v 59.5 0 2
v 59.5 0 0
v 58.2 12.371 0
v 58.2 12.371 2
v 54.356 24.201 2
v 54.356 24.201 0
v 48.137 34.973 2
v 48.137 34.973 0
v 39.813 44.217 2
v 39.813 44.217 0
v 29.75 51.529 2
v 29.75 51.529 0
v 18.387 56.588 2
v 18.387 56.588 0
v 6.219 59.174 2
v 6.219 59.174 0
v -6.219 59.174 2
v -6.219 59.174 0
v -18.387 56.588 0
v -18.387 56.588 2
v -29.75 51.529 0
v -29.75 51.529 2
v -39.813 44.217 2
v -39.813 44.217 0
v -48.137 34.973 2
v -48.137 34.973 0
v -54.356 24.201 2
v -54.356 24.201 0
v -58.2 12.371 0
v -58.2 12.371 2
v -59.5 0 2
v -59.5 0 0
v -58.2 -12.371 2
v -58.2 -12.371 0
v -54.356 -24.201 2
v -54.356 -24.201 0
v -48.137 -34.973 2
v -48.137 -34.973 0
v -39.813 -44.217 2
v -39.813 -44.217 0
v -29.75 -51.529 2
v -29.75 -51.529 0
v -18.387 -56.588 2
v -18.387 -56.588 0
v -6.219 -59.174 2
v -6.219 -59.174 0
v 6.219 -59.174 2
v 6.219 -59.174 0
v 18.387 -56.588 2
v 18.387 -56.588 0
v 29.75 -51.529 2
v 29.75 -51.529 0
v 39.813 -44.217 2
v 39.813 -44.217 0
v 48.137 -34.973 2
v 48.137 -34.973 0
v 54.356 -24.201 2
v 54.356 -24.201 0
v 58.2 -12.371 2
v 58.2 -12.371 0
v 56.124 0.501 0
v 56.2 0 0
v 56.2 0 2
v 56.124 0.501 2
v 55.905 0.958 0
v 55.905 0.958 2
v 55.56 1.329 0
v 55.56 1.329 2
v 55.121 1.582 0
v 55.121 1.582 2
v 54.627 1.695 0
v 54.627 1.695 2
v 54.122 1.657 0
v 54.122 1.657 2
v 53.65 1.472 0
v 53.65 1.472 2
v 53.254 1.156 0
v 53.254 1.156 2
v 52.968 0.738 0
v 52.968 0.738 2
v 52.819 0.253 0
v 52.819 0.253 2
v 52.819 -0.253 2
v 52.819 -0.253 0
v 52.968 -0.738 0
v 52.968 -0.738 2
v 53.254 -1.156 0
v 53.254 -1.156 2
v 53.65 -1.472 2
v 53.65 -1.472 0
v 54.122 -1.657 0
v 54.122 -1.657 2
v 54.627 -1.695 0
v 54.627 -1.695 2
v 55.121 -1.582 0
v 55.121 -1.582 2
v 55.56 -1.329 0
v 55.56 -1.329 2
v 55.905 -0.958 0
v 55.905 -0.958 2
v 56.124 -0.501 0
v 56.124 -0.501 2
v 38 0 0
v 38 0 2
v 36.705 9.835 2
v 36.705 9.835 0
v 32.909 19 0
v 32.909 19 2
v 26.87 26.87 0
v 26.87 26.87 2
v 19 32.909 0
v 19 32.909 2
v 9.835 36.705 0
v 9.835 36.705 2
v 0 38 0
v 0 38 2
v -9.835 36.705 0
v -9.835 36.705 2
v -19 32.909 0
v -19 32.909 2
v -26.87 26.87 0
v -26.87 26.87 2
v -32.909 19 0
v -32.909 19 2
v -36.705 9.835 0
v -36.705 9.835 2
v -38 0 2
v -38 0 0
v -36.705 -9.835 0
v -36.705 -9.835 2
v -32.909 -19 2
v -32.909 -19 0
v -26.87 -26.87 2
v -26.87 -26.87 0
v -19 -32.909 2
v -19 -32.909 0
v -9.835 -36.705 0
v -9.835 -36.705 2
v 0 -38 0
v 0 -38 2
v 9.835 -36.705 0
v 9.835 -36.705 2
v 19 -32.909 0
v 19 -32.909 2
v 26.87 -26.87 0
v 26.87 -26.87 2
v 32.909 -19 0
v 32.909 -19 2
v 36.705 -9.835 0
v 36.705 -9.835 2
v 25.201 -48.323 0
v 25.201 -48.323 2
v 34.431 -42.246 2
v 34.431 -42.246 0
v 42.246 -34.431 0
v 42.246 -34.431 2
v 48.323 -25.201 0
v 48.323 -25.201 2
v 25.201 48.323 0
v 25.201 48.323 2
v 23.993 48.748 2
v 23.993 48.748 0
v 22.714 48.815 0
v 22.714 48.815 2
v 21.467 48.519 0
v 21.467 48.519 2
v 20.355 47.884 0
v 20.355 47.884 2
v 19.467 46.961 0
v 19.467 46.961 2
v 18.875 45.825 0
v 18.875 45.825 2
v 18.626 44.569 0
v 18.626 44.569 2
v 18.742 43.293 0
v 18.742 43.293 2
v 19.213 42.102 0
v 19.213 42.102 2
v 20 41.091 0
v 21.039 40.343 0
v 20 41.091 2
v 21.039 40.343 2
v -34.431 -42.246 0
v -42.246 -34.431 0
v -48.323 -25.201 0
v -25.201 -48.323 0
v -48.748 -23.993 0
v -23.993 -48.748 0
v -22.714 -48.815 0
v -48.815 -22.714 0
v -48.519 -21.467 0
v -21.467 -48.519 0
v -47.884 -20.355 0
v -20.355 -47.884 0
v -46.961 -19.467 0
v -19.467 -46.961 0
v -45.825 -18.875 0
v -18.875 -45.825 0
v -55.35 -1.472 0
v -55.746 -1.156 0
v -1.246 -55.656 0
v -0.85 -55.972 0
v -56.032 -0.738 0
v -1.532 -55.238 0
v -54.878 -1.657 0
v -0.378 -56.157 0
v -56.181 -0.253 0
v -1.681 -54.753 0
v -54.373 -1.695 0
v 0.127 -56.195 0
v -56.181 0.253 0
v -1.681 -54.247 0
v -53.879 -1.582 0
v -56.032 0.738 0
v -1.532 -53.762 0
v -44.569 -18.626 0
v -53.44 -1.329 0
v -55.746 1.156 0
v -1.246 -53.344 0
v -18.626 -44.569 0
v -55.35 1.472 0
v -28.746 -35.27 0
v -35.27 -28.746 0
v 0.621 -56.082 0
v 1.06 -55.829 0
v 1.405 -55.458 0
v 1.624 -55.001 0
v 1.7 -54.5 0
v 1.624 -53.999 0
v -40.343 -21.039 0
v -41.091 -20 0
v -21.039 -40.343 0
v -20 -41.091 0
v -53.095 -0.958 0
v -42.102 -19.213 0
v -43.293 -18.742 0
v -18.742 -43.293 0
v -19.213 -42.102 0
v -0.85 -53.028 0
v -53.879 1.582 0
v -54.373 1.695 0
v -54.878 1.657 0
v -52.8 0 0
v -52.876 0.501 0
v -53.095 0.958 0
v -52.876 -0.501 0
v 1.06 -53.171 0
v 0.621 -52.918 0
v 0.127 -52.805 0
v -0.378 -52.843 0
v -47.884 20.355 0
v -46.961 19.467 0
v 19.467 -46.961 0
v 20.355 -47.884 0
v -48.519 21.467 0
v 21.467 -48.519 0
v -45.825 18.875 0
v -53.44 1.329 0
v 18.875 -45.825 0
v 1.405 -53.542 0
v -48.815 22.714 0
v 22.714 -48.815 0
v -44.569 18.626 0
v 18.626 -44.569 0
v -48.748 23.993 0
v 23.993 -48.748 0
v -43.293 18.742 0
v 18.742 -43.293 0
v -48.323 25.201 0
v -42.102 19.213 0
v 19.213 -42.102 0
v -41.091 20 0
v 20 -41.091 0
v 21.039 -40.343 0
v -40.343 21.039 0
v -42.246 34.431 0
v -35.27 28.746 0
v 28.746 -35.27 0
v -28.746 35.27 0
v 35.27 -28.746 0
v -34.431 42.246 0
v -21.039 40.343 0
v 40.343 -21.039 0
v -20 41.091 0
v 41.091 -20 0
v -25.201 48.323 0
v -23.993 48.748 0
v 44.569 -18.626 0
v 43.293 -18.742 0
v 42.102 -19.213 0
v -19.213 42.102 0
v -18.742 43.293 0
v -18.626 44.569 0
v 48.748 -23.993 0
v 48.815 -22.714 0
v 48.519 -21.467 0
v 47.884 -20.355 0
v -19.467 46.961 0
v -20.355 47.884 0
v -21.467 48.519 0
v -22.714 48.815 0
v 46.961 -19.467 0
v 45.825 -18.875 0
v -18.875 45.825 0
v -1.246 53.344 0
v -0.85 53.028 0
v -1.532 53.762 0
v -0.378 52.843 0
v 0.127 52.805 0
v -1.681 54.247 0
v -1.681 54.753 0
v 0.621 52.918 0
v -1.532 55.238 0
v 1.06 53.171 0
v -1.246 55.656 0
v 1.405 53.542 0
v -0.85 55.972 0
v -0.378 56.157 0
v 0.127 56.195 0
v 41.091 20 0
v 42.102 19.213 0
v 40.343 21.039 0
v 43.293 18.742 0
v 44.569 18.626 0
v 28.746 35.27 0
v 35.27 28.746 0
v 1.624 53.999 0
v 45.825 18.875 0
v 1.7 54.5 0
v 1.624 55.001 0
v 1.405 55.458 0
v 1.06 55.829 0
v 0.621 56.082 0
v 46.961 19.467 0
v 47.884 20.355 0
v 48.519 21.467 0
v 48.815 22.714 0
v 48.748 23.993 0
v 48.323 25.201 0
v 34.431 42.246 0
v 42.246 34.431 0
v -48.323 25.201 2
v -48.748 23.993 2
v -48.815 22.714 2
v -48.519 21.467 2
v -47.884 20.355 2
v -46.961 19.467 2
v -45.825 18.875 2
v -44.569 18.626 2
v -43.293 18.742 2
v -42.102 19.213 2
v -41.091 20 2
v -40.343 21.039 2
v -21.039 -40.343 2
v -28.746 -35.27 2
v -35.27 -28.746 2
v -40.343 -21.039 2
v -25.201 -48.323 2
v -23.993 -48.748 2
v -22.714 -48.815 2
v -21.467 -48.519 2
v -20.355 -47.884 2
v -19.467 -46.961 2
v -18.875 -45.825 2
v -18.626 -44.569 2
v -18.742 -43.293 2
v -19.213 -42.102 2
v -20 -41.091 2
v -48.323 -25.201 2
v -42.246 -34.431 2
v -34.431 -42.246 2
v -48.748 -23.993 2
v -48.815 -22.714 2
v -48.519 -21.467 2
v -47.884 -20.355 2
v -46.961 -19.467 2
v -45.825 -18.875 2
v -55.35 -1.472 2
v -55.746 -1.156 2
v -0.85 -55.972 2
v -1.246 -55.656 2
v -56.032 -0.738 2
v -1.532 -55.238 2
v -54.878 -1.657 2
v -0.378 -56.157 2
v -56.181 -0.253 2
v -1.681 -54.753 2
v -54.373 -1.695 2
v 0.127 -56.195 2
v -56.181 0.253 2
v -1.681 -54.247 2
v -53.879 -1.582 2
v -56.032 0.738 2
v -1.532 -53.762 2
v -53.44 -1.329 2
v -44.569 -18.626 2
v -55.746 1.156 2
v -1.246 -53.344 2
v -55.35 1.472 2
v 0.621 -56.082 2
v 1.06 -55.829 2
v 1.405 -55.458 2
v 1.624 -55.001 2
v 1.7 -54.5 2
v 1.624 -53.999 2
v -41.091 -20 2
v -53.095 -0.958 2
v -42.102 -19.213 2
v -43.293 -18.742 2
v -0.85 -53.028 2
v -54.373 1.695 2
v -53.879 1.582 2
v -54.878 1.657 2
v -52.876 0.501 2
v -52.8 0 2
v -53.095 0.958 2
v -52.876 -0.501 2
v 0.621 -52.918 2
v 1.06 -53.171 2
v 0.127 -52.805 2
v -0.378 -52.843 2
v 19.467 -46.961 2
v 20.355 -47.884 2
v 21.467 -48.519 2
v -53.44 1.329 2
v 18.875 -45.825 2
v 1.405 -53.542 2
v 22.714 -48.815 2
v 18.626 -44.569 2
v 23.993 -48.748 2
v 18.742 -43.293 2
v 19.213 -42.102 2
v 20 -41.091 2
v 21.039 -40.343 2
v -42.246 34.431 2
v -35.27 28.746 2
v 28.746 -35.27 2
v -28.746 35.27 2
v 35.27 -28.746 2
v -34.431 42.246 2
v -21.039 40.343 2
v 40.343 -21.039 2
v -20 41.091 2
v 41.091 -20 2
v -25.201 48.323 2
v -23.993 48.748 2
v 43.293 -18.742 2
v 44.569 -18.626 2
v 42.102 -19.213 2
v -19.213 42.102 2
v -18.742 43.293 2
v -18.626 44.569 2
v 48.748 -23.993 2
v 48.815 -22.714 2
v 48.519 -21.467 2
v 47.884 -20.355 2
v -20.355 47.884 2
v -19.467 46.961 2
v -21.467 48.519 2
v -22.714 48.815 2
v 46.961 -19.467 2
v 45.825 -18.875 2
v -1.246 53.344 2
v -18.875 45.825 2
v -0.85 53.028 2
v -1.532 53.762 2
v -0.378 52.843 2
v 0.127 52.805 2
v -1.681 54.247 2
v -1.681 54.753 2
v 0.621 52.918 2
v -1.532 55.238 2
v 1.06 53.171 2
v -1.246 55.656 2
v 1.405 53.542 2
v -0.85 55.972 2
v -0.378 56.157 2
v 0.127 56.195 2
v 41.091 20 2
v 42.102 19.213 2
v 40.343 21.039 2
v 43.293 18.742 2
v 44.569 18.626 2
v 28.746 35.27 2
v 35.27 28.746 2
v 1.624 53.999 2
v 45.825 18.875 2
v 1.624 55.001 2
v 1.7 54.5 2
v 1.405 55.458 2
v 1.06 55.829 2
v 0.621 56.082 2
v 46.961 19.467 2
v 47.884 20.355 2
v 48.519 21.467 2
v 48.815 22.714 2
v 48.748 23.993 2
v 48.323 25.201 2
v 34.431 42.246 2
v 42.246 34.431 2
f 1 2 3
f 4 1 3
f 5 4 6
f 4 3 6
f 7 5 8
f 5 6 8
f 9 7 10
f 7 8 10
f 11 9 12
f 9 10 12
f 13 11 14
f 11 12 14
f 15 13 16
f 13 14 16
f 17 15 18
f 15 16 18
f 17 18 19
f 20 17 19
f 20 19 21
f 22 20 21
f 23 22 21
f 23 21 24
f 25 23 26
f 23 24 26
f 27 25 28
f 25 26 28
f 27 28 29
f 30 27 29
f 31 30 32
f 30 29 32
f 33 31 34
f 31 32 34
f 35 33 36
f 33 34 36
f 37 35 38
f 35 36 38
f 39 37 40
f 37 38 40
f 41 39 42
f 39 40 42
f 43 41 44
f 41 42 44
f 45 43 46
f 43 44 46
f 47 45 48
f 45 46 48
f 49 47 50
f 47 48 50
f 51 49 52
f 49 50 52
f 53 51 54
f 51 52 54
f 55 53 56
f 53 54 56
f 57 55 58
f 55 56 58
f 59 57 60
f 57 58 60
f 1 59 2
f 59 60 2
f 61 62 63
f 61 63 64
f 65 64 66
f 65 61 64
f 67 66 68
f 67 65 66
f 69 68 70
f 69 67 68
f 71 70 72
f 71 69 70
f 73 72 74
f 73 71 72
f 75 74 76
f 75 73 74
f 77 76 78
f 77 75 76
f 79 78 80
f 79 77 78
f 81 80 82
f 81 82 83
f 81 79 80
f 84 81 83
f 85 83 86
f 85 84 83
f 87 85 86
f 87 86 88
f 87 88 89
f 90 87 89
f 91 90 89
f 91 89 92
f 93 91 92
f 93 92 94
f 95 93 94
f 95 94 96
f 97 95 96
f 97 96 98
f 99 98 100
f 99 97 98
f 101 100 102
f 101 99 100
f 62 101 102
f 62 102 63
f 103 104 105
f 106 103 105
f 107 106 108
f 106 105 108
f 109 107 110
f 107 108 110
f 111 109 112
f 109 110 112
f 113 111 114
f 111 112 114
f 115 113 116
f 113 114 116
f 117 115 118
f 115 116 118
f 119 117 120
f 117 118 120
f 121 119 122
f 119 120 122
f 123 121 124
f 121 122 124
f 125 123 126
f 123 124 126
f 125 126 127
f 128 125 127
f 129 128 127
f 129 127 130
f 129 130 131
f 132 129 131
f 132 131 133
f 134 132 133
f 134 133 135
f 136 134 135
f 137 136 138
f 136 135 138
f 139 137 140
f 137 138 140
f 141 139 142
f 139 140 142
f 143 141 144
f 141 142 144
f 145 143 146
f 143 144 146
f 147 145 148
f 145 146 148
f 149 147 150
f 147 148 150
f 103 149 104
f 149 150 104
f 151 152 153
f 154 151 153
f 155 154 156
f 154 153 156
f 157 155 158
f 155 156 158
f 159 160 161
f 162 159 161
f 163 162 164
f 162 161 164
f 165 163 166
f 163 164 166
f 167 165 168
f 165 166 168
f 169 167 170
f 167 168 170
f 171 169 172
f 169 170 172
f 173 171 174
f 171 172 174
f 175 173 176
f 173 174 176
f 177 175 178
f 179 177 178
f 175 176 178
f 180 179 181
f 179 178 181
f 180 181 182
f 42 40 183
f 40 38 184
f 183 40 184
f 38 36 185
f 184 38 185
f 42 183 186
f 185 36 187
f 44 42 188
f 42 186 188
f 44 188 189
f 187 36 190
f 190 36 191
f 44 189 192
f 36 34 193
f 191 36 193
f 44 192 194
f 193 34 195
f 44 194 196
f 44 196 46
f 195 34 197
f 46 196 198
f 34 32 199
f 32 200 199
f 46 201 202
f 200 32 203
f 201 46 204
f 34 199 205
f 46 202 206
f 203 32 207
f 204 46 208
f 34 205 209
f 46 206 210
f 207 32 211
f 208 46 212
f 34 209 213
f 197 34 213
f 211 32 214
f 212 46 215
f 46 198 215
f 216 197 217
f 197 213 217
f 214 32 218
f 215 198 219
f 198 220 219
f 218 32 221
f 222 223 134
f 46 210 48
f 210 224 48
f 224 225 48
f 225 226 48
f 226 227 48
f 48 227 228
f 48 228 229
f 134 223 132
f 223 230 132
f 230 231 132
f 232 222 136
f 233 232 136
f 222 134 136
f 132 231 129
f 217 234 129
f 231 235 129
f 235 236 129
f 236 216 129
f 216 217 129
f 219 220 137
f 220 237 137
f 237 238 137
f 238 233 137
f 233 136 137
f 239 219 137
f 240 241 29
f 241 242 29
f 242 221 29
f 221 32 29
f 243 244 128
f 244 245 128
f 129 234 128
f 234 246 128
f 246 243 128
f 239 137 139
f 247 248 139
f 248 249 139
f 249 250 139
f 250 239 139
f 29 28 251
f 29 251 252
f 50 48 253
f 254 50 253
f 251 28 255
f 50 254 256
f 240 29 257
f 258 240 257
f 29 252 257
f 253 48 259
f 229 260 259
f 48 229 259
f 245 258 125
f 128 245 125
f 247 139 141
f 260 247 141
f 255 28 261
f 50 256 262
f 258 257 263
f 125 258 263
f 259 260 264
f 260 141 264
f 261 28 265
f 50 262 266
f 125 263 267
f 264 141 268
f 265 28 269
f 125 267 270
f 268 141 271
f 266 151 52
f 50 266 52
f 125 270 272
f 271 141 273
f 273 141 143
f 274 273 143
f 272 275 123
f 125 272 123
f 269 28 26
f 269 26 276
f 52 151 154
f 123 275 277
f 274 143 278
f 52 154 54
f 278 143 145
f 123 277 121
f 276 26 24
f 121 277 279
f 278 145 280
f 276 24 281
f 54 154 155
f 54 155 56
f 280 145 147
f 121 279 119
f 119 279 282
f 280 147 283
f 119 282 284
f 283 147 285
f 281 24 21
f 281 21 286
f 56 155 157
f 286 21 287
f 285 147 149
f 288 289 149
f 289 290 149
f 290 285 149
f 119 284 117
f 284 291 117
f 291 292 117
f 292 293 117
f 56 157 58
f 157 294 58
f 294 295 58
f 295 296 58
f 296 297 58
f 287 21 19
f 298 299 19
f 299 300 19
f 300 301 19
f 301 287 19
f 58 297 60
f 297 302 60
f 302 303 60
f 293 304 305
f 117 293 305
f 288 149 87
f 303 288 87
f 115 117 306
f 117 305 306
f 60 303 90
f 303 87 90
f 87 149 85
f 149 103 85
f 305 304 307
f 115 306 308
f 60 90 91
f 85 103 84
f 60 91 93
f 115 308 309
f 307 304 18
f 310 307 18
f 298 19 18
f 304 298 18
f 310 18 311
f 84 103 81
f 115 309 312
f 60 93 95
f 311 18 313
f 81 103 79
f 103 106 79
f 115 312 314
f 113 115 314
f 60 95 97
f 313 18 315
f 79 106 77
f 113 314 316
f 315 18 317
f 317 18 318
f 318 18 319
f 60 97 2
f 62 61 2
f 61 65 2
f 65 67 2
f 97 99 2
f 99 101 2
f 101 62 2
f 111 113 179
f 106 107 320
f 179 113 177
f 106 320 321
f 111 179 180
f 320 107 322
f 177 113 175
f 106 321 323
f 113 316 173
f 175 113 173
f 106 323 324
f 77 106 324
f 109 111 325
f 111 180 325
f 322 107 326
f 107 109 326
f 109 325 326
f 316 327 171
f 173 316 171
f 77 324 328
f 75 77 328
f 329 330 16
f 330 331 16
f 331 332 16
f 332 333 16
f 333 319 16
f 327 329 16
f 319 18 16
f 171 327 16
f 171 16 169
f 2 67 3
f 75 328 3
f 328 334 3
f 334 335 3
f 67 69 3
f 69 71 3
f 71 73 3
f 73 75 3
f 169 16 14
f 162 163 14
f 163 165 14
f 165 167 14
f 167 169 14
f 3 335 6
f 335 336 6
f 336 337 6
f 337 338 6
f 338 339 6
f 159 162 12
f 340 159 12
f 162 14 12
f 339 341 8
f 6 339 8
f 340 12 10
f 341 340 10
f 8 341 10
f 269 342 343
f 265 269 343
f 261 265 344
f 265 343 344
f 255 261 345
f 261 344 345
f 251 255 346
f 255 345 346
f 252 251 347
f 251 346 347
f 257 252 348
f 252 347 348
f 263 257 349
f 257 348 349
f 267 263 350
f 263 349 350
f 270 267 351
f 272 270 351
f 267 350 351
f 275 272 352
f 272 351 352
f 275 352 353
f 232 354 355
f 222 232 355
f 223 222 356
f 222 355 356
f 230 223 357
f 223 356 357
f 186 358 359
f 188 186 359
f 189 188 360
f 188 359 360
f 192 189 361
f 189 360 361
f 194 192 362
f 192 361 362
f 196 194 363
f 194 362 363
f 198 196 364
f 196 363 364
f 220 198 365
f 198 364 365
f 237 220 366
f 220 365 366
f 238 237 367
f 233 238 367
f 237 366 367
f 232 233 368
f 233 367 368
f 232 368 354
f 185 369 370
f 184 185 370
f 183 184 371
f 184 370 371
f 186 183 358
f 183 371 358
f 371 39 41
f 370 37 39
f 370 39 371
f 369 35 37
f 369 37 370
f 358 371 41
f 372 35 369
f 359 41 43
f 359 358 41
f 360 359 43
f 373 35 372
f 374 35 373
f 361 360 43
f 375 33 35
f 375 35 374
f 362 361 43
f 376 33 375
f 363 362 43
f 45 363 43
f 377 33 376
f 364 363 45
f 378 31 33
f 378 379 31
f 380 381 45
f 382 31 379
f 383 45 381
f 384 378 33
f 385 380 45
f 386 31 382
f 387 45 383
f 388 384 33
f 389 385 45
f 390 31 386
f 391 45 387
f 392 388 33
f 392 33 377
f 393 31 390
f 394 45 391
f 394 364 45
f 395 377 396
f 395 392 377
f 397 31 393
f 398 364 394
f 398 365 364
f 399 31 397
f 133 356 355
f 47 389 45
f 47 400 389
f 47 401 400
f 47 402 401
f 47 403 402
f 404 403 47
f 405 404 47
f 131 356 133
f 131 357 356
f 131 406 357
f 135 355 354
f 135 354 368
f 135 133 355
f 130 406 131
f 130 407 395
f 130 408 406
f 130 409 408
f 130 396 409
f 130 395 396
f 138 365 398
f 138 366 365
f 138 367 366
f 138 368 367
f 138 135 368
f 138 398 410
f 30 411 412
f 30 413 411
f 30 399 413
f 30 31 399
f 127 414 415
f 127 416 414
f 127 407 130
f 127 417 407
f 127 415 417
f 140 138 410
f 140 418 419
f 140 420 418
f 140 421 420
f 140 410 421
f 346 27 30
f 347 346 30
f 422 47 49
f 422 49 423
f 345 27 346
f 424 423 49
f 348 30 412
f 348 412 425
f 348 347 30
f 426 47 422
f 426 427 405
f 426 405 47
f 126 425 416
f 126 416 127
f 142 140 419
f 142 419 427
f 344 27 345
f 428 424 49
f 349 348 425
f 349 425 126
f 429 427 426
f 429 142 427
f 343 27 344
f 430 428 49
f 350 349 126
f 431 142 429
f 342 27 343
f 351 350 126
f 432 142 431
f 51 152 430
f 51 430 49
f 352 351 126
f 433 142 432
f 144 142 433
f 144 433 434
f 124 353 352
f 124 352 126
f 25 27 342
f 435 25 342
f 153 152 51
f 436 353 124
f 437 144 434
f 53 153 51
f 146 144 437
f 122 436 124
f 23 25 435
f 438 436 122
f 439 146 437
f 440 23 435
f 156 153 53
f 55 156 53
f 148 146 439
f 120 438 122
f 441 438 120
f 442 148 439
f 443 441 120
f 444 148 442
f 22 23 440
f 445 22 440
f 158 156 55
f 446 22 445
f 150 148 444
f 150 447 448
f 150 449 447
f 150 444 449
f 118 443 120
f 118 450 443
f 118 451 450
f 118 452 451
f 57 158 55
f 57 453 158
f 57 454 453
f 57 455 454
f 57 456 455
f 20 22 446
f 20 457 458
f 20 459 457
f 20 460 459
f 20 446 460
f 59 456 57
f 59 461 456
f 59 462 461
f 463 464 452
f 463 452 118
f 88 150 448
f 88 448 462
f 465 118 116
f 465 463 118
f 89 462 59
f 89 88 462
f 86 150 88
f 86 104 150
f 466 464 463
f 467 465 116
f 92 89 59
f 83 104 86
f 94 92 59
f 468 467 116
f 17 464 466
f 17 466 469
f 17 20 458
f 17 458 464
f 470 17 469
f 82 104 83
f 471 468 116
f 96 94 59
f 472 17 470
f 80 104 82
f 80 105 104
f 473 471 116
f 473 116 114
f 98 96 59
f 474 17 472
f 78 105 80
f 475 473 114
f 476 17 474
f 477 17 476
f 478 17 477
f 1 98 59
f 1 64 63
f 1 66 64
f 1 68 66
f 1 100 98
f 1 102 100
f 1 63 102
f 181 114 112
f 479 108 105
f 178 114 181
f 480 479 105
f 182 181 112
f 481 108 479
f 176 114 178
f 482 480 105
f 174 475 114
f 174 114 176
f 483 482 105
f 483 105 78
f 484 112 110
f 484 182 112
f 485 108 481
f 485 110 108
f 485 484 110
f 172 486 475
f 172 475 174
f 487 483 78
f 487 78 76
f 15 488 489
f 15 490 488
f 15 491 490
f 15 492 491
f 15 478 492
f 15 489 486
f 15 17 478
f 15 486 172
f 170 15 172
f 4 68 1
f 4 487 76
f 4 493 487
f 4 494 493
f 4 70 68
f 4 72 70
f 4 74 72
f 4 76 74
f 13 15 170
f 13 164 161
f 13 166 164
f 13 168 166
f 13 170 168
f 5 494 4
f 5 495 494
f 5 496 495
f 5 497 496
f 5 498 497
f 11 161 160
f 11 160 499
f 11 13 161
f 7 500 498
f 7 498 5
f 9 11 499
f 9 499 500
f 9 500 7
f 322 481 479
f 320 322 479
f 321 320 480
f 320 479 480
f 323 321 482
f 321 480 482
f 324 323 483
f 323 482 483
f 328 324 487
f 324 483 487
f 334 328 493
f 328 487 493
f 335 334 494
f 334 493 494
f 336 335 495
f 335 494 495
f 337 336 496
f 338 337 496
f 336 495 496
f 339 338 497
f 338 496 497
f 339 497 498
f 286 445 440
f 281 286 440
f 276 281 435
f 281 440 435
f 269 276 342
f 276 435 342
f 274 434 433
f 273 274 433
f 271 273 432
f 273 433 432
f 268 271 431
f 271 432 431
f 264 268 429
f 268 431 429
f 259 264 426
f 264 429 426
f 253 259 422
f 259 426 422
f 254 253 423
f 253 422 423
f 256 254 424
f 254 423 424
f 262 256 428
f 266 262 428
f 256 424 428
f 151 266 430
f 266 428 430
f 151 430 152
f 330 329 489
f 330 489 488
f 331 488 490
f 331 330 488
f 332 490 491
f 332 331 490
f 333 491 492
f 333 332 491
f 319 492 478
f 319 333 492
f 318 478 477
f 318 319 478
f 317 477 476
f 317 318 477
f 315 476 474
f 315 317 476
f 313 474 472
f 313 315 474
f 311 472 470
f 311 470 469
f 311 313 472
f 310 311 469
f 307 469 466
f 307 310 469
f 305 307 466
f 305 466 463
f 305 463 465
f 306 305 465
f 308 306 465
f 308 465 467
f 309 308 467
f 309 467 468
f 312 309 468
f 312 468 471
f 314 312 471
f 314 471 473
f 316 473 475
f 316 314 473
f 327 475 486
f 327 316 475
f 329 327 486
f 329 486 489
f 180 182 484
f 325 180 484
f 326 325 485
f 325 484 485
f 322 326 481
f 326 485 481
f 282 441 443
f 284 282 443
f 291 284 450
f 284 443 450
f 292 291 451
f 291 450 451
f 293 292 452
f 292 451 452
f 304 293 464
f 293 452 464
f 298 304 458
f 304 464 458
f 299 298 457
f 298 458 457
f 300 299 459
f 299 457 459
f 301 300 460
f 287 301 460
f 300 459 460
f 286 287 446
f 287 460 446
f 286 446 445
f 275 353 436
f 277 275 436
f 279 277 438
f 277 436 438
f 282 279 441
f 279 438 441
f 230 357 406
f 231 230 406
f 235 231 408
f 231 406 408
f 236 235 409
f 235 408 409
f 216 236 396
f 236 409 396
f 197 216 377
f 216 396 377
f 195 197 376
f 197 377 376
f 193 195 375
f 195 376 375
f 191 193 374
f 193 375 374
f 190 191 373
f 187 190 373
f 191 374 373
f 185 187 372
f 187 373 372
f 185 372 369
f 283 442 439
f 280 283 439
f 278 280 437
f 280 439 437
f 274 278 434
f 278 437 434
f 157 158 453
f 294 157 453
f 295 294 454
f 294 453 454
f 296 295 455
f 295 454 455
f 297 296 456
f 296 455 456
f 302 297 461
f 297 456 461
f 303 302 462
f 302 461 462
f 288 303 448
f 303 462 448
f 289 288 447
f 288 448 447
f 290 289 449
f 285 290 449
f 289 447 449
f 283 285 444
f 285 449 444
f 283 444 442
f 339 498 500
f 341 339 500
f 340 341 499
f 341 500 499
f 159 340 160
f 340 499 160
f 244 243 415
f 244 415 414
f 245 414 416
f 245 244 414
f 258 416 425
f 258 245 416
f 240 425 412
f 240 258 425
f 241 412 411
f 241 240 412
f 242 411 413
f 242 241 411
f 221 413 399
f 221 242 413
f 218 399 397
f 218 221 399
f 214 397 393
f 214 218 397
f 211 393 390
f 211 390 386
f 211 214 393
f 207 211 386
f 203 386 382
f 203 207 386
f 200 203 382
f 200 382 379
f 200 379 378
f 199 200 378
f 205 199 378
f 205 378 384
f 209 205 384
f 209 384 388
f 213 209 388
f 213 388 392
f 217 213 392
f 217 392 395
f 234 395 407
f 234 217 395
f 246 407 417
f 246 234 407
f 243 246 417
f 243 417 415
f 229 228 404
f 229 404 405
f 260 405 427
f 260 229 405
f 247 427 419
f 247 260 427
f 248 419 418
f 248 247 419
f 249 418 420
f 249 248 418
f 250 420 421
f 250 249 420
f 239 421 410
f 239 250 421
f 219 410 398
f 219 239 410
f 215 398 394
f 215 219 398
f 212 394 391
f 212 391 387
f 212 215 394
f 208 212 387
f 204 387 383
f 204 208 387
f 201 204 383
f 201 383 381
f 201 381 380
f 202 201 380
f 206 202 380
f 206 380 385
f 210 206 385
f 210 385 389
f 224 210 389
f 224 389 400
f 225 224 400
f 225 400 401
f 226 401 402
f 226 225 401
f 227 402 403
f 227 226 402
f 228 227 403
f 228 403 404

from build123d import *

# Parameters (mm, degrees)
SKETCH_1_R               = 59.5
SKETCH_1_R_2             = 1.7
EXTRUDE_4_DEPTH          = 2
SKETCH_2_R               = 38
CUT_EXTRUDE_1_DEPTH      = 2
CUT_EXTRUDE_3_DEPTH      = 2
PATTERN_CIRCULAR_2_COUNT = 4


with BuildPart() as part:
    # 草图1 → 凸台-拉伸4 (new body)
    with BuildSketch(Plane.XY):
        Circle(SKETCH_1_R)
        with Locations((0, 54.5)):
            Circle(SKETCH_1_R_2, mode=Mode.SUBTRACT)
        with Locations((54.5, 0)):
            Circle(SKETCH_1_R_2, mode=Mode.SUBTRACT)
        with Locations((0, -54.5)):
            Circle(SKETCH_1_R_2, mode=Mode.SUBTRACT)
        with Locations((-54.5, 0)):
            Circle(SKETCH_1_R_2, mode=Mode.SUBTRACT)
    extrude(amount=EXTRUDE_4_DEPTH)

    # 草图2 → 切除-拉伸1 (cut)
    with BuildSketch(Plane.XY.offset(2)):
        Circle(SKETCH_2_R)
    extrude(amount=-CUT_EXTRUDE_1_DEPTH, mode=Mode.SUBTRACT)

    # 草图4 → 切除-拉伸3 (cut)
    with BuildSketch(Plane.XY.offset(2)):
        with BuildLine():
            ThreePointArc((21.039420393, 40.34343552), (32.173358544, 32.173358544), (40.34343552, 21.039420393))
            ThreePointArc((40.34343552, 21.039420393), (46.414267423, 19.130232084), (48.323455732, 25.201063987))
            ThreePointArc((48.323455732, 25.201063987), (38.537319575, 38.537319575), (25.201063987, 48.323455732))
            ThreePointArc((25.201063987, 48.323455732), (19.130232084, 46.414267423), (21.039420393, 40.34343552))
        make_face()
    cut_extrude_3 = extrude(amount=-CUT_EXTRUDE_3_DEPTH, mode=Mode.SUBTRACT)

    # 阵列(圆周)2: 切除-拉伸3 ×4 about axis
    pattern_circular_2_axis = Axis((0, 0, 0), (0, 0, 1))
    for i in range(1, PATTERN_CIRCULAR_2_COUNT):
        add(cut_extrude_3.rotate(pattern_circular_2_axis, i * 360 / PATTERN_CIRCULAR_2_COUNT), mode=Mode.SUBTRACT)


solid = part.part
